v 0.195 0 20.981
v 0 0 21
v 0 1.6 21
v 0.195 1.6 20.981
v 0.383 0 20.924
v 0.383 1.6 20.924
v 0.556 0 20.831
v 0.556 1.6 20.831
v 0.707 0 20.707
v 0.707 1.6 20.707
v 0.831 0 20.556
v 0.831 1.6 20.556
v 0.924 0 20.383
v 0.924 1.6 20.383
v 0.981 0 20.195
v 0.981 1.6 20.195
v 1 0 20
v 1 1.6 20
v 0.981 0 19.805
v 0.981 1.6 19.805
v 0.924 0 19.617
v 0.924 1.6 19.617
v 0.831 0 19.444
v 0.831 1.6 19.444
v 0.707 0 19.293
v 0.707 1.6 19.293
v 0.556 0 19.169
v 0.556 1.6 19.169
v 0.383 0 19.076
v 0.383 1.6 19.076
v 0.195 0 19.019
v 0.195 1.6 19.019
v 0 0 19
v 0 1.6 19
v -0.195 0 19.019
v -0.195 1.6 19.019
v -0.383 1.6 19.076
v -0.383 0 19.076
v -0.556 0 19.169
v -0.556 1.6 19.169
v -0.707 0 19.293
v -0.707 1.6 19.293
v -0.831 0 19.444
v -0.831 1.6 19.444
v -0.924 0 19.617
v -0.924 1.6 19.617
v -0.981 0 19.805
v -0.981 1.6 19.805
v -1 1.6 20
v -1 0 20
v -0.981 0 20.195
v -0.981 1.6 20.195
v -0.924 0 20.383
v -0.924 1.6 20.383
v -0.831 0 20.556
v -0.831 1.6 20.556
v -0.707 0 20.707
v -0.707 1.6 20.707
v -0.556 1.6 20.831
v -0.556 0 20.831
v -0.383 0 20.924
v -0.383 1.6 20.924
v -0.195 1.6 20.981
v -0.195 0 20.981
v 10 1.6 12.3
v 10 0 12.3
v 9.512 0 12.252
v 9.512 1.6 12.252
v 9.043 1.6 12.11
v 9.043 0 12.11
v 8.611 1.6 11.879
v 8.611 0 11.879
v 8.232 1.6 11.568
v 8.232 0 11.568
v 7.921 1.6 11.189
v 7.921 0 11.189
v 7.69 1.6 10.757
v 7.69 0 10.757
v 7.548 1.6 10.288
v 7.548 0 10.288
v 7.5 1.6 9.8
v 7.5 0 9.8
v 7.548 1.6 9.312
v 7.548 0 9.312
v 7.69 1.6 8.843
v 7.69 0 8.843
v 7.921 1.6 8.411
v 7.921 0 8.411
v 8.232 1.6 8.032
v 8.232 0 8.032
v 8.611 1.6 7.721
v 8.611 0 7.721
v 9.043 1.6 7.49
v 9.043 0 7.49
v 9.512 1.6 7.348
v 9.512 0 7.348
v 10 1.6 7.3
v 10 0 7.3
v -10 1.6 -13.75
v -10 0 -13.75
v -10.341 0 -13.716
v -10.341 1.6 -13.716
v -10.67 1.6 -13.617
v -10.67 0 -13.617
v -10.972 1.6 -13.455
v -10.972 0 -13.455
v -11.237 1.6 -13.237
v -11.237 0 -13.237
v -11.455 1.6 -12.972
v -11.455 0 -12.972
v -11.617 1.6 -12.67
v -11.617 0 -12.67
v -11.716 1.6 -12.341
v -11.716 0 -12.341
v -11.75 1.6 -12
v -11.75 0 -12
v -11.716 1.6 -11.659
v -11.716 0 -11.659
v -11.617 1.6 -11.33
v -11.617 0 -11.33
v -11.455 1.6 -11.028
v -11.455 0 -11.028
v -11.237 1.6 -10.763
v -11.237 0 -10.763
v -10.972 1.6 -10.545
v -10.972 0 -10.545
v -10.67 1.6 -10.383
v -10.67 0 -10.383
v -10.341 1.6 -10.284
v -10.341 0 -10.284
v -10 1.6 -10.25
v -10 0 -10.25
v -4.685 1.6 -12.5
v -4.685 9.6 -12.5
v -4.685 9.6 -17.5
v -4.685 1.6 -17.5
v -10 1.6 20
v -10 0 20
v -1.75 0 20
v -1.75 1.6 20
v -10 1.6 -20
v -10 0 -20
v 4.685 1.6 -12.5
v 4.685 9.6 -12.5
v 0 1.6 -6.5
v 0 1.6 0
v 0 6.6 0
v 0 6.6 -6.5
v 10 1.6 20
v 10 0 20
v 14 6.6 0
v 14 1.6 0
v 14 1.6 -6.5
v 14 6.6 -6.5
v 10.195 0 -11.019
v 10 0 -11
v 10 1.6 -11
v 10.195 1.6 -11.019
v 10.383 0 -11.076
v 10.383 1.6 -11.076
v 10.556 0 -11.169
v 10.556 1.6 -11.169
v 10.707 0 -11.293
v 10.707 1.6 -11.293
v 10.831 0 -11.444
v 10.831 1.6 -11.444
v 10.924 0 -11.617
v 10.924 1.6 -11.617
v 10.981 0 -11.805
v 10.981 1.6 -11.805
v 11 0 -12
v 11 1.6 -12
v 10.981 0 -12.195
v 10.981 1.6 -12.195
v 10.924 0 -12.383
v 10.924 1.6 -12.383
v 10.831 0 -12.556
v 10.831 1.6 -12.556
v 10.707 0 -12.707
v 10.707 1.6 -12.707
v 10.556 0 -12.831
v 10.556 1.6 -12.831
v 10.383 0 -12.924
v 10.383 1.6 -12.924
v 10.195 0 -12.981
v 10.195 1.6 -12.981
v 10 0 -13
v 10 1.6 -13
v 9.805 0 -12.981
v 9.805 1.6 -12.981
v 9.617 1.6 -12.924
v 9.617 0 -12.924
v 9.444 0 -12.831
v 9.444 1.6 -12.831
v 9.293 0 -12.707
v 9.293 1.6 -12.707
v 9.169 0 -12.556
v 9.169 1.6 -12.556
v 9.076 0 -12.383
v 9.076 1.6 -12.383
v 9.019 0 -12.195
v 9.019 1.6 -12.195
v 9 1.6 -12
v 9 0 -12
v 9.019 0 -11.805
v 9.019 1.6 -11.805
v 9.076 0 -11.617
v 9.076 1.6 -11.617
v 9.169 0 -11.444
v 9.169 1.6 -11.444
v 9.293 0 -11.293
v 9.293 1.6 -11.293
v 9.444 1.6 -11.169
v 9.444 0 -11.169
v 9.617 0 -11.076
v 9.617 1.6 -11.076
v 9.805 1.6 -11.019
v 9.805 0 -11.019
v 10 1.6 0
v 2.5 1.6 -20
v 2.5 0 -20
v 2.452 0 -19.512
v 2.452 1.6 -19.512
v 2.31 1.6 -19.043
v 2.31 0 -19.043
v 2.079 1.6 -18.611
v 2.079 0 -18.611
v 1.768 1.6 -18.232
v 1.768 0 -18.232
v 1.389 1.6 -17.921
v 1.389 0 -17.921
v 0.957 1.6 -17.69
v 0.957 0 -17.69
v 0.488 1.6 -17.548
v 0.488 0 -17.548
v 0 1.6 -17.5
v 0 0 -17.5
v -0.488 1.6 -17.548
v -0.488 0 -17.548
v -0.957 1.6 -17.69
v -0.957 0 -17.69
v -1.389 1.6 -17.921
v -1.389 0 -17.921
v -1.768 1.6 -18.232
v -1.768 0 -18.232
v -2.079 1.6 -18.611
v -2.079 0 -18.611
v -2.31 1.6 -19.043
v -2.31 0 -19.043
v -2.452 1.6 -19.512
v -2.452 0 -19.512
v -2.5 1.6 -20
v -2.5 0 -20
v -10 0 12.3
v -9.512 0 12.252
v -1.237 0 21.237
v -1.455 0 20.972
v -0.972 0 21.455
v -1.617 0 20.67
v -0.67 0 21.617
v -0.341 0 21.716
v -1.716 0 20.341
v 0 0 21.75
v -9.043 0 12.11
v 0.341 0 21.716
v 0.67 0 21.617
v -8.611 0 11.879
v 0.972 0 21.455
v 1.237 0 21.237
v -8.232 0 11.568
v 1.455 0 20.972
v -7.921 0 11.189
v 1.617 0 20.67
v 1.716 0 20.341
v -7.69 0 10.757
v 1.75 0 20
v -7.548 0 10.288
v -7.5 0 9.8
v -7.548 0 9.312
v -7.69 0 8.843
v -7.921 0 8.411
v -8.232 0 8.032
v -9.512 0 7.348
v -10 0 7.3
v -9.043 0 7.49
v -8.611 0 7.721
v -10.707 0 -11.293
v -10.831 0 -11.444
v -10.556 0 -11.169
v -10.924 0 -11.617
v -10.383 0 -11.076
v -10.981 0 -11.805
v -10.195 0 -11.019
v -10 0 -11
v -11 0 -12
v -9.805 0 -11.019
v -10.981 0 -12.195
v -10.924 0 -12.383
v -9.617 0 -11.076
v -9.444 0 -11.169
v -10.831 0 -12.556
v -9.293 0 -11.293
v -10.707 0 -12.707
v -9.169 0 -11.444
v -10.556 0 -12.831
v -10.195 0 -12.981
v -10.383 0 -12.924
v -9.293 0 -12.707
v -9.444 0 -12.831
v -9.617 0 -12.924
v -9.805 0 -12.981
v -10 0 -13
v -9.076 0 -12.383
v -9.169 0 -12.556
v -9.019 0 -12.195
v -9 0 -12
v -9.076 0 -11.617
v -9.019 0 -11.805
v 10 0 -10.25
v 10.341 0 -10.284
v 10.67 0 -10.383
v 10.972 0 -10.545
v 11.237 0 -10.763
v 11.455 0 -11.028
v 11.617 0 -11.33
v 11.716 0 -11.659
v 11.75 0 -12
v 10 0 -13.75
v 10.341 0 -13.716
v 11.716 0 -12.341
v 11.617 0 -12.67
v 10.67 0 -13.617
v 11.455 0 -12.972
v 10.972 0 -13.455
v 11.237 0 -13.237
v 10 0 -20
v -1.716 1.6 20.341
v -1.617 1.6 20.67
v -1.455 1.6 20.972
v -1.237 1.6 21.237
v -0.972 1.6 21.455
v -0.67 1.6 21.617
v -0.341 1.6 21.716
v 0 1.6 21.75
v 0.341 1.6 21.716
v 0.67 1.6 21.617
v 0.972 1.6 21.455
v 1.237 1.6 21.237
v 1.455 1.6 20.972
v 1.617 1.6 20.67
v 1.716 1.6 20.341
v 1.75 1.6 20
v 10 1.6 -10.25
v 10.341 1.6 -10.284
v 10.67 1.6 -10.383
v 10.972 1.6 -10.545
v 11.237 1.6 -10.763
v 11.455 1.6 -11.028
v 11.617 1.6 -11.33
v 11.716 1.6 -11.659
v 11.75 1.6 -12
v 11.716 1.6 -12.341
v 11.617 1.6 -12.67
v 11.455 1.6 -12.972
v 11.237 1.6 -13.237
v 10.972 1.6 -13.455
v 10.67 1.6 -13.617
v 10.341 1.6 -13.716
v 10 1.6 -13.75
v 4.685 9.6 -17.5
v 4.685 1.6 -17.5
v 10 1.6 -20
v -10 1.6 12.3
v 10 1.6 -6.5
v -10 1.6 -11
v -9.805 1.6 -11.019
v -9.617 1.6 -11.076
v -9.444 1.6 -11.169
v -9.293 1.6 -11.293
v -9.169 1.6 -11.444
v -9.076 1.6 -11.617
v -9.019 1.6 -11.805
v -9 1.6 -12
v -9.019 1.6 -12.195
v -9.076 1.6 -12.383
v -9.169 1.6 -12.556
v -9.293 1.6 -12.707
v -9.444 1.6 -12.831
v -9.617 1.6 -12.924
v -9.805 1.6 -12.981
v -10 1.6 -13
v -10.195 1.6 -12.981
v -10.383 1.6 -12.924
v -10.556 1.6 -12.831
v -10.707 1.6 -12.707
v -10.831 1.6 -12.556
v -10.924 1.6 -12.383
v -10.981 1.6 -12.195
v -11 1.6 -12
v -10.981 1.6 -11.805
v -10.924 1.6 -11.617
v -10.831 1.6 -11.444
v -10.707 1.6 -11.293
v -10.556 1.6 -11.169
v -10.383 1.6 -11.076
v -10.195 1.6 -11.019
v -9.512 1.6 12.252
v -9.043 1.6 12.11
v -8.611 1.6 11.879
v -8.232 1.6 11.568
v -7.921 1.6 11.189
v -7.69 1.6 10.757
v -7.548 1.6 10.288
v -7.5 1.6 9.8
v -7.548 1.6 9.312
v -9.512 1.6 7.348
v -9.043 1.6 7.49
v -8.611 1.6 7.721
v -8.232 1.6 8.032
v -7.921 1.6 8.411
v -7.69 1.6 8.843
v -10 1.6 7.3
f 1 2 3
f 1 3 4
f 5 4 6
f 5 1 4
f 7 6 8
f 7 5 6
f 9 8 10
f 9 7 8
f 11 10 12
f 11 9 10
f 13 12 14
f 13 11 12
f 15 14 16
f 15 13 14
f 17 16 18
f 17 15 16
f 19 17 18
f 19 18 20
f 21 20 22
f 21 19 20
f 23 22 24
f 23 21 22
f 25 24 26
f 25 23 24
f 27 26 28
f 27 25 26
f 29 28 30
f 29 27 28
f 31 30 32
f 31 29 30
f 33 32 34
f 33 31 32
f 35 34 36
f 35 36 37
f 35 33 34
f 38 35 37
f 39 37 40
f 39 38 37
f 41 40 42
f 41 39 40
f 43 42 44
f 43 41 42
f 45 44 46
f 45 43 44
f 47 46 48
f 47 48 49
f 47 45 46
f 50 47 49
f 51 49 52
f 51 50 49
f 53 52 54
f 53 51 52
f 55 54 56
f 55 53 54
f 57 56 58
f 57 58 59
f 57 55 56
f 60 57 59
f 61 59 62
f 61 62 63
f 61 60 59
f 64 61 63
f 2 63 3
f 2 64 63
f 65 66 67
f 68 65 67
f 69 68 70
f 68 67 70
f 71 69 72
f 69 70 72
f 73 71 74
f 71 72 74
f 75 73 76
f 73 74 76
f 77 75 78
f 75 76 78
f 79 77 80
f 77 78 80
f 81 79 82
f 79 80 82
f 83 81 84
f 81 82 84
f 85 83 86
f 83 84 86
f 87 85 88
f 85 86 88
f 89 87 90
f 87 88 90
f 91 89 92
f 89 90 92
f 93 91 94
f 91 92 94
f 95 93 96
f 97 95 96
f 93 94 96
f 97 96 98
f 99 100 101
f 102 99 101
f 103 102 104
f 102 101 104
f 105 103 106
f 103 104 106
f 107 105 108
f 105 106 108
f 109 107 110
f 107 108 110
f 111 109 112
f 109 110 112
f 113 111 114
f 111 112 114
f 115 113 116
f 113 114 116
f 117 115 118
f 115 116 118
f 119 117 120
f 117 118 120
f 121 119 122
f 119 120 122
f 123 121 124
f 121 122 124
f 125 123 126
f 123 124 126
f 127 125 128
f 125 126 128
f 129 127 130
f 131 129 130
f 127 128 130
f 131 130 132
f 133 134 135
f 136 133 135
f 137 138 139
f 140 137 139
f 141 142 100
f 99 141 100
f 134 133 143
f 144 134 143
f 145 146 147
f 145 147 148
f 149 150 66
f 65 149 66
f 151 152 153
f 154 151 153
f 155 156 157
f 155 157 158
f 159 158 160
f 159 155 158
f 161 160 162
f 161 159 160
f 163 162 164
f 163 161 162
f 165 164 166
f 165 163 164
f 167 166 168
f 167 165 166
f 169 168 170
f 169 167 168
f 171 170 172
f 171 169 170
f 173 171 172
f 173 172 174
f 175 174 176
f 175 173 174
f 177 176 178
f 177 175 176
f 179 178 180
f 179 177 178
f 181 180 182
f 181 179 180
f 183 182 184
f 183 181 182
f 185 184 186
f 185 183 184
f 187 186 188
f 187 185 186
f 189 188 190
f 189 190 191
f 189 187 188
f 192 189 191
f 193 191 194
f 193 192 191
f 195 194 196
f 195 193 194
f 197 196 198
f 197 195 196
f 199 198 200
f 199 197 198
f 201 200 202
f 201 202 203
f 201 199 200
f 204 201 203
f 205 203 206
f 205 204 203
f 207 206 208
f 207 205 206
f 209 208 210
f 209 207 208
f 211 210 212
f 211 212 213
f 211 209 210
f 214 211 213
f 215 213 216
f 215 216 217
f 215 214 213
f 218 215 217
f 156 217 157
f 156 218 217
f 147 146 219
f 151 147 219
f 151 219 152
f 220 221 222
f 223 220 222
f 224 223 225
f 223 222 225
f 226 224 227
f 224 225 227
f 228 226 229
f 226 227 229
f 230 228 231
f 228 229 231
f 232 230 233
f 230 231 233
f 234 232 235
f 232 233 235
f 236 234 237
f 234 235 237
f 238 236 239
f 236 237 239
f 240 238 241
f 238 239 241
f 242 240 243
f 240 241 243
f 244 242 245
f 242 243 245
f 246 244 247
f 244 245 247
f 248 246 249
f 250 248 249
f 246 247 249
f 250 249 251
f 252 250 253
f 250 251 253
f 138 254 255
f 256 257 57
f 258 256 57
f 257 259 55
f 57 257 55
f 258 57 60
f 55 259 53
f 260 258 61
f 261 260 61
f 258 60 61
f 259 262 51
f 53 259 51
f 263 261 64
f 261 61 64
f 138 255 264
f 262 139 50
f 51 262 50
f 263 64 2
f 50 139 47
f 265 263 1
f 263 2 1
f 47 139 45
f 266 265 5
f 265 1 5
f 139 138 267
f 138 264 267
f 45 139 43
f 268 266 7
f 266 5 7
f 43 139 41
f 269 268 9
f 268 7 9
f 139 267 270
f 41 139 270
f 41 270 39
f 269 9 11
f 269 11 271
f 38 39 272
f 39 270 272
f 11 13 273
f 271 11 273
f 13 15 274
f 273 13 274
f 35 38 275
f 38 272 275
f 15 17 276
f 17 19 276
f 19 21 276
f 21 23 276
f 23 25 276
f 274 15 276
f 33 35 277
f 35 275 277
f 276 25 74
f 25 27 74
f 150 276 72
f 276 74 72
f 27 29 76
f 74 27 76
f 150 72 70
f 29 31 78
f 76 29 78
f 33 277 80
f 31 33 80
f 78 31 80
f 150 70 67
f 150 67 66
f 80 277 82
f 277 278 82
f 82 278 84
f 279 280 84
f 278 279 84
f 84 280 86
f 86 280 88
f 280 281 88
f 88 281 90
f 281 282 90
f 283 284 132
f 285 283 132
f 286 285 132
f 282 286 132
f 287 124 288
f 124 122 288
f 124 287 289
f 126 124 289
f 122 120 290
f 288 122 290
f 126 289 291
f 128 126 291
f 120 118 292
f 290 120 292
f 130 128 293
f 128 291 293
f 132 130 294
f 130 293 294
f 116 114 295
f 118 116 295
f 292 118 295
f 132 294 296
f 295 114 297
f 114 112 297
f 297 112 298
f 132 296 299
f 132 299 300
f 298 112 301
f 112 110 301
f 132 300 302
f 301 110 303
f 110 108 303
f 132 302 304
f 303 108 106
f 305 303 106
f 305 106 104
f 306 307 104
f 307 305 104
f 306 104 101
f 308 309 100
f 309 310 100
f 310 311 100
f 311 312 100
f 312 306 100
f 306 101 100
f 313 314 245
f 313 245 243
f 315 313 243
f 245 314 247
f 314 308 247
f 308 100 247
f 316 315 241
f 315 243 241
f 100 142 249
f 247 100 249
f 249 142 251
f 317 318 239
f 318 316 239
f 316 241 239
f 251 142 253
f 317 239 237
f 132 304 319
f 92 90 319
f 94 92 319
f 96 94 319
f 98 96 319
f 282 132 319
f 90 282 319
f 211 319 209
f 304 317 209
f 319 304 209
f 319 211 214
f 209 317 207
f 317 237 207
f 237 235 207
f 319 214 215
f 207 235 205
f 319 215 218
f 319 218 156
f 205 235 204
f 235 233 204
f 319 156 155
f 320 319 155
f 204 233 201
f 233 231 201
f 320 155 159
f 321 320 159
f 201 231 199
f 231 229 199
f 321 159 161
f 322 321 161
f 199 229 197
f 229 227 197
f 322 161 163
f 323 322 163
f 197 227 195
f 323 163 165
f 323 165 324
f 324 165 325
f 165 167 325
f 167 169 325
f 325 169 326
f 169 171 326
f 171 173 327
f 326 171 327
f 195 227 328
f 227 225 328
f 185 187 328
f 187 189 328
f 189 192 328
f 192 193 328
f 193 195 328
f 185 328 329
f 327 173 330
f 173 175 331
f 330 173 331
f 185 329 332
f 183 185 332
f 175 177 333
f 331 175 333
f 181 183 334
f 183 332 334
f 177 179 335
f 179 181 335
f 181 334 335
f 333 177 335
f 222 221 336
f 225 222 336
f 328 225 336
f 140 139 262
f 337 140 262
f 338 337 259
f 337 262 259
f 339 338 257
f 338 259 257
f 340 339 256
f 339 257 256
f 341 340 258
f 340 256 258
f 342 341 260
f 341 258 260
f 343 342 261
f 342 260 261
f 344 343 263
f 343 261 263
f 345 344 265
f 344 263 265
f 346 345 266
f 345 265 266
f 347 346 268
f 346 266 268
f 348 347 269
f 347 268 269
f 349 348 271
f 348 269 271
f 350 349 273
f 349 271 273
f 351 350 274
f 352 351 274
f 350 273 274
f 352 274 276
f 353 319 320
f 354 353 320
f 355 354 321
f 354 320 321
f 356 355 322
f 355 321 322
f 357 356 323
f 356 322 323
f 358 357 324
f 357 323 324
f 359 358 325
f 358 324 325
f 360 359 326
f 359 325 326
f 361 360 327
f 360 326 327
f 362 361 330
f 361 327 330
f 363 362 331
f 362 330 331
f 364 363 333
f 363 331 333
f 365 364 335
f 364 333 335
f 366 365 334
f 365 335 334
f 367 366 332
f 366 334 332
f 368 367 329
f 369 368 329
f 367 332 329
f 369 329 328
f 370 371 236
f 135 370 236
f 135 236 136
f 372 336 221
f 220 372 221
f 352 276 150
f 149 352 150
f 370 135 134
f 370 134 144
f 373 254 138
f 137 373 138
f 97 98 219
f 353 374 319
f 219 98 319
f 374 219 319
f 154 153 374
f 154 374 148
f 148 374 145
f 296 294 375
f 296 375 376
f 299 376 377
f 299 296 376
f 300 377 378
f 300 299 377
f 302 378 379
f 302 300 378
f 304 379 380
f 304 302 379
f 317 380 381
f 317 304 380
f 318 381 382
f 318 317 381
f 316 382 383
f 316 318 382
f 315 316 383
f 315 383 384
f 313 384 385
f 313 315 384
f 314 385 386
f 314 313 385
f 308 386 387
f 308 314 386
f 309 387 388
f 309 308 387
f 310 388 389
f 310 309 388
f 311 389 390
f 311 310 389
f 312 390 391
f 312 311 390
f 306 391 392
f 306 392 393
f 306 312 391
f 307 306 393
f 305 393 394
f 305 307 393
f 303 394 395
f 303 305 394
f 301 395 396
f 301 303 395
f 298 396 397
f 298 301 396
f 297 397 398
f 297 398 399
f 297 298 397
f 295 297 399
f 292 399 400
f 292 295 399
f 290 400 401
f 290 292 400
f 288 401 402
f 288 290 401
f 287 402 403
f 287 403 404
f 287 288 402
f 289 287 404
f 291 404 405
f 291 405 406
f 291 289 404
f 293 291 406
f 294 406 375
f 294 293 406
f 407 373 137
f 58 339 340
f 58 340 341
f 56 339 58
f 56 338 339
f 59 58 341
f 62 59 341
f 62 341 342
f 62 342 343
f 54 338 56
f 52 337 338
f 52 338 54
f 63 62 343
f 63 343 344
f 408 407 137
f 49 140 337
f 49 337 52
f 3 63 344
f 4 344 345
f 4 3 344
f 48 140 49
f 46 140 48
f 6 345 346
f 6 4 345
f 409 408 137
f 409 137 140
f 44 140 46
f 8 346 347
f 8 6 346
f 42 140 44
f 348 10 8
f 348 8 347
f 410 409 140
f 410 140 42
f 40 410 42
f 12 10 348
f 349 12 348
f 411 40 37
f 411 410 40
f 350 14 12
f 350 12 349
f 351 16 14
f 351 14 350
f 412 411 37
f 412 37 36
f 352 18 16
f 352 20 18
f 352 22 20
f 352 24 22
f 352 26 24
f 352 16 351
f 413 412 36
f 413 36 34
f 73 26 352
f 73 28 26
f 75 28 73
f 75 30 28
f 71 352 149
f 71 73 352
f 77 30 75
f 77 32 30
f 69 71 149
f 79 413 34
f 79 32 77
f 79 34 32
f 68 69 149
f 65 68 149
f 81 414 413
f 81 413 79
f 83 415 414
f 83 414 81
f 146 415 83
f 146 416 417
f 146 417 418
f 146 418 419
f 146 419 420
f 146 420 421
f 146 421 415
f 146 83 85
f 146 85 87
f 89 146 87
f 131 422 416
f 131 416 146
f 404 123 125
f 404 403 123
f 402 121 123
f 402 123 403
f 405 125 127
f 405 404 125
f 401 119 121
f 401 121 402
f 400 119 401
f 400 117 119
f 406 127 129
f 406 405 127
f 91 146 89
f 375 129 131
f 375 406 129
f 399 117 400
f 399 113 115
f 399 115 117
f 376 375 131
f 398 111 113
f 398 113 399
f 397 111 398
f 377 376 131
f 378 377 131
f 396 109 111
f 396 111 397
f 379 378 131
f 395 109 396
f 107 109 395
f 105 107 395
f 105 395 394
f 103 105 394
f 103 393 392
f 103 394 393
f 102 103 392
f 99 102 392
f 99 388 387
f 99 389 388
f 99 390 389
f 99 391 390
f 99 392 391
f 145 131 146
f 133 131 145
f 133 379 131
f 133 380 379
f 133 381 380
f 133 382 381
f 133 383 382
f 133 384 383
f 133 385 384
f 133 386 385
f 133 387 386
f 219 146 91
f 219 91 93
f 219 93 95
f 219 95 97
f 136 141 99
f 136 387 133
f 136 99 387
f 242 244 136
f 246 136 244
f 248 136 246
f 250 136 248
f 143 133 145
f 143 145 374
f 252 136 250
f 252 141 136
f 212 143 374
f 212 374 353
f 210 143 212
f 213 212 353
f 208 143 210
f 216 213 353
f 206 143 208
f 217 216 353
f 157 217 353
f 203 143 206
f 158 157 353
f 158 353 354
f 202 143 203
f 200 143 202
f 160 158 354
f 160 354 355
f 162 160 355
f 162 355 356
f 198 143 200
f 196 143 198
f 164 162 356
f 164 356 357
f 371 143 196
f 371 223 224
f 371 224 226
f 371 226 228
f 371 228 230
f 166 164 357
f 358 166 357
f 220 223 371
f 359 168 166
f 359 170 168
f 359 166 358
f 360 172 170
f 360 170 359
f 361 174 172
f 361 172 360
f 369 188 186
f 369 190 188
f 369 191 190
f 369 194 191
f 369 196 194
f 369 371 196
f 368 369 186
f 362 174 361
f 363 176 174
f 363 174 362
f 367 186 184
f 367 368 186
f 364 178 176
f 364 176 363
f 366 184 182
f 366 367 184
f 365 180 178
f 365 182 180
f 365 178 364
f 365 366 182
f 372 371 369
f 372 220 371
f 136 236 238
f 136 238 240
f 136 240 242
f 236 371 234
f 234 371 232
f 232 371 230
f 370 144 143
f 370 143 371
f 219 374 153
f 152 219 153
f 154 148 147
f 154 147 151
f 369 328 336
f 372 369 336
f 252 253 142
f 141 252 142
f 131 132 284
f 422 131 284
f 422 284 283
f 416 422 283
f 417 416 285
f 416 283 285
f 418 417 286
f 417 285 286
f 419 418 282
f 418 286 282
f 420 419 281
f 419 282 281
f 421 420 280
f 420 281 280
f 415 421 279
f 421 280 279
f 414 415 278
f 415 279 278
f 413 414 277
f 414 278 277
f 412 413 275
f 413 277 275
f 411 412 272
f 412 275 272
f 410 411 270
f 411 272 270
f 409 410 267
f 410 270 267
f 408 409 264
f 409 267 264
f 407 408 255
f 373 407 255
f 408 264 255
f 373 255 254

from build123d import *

# Parameters (mm, degrees)
SKETCH1_R                 = 1
PCB_DEPTH                 = 1.6
SKETCH2_W                 = 14
SKETCH2_H                 = 6.5
ELECTRODE_CONNECTOR_DEPTH = 5
SKETCH2_3_W               = 9.369035826
SKETCH2_3_H               = 5
CONTROL_CONNECTOR_DEPTH   = 8


with BuildPart() as part:
    # Sketch1 → PCB (new body)
    with BuildSketch(Plane(origin=(0, 0, 0), x_dir=(1, 0, 0), z_dir=(0, 1, 0))):
        with BuildLine():
            ThreePointArc((-1.75, -20), (0, -21.75), (1.75, -20))
            Line((1.75, -20), (10, -20))
            Line((10, -20), (10, -12.3))
            ThreePointArc((10, -12.3), (7.5, -9.8), (10, -7.3))
            Line((10, -7.3), (10, 10.25))
            ThreePointArc((10, 10.25), (11.75, 12), (10, 13.75))
            Line((10, 13.75), (10, 20))
            Line((10, 20), (2.5, 20))
            ThreePointArc((2.5, 20), (0, 17.5), (-2.5, 20))
            Line((-2.5, 20), (-10, 20))
            Line((-10, 20), (-10, 13.75))
            ThreePointArc((-10, 13.75), (-11.75, 12), (-10, 10.25))
            Line((-10, 10.25), (-10, -7.3))
            ThreePointArc((-10, -7.3), (-7.5, -9.8), (-10, -12.3))
            Line((-10, -12.3), (-10, -20))
            Line((-10, -20), (-1.75, -20))
        make_face()
        with Locations((0, -20)):
            Circle(SKETCH1_R, mode=Mode.SUBTRACT)
        with Locations((-10, 12)):
            Circle(SKETCH1_R, mode=Mode.SUBTRACT)
        with Locations((10, 12)):
            Circle(SKETCH1_R, mode=Mode.SUBTRACT)
    extrude(amount=PCB_DEPTH)

    # Sketch2 → Electrode_connector (add)
    with BuildSketch(Plane(origin=(0, 1.6, 0), x_dir=(1, 0, 0), z_dir=(0, 1, 0))):
        with Locations((7, 3.25)):
            Rectangle(SKETCH2_W, SKETCH2_H)
    extrude(amount=ELECTRODE_CONNECTOR_DEPTH)

    # Sketch2<3> → Control_connector (add)
    with BuildSketch(Plane(origin=(0, 1.6, 0), x_dir=(1, 0, 0), z_dir=(0, 1, 0))):
        with Locations((0, 15)):
            Rectangle(SKETCH2_3_W, SKETCH2_3_H)
    extrude(amount=CONTROL_CONNECTOR_DEPTH)


solid = part.part
